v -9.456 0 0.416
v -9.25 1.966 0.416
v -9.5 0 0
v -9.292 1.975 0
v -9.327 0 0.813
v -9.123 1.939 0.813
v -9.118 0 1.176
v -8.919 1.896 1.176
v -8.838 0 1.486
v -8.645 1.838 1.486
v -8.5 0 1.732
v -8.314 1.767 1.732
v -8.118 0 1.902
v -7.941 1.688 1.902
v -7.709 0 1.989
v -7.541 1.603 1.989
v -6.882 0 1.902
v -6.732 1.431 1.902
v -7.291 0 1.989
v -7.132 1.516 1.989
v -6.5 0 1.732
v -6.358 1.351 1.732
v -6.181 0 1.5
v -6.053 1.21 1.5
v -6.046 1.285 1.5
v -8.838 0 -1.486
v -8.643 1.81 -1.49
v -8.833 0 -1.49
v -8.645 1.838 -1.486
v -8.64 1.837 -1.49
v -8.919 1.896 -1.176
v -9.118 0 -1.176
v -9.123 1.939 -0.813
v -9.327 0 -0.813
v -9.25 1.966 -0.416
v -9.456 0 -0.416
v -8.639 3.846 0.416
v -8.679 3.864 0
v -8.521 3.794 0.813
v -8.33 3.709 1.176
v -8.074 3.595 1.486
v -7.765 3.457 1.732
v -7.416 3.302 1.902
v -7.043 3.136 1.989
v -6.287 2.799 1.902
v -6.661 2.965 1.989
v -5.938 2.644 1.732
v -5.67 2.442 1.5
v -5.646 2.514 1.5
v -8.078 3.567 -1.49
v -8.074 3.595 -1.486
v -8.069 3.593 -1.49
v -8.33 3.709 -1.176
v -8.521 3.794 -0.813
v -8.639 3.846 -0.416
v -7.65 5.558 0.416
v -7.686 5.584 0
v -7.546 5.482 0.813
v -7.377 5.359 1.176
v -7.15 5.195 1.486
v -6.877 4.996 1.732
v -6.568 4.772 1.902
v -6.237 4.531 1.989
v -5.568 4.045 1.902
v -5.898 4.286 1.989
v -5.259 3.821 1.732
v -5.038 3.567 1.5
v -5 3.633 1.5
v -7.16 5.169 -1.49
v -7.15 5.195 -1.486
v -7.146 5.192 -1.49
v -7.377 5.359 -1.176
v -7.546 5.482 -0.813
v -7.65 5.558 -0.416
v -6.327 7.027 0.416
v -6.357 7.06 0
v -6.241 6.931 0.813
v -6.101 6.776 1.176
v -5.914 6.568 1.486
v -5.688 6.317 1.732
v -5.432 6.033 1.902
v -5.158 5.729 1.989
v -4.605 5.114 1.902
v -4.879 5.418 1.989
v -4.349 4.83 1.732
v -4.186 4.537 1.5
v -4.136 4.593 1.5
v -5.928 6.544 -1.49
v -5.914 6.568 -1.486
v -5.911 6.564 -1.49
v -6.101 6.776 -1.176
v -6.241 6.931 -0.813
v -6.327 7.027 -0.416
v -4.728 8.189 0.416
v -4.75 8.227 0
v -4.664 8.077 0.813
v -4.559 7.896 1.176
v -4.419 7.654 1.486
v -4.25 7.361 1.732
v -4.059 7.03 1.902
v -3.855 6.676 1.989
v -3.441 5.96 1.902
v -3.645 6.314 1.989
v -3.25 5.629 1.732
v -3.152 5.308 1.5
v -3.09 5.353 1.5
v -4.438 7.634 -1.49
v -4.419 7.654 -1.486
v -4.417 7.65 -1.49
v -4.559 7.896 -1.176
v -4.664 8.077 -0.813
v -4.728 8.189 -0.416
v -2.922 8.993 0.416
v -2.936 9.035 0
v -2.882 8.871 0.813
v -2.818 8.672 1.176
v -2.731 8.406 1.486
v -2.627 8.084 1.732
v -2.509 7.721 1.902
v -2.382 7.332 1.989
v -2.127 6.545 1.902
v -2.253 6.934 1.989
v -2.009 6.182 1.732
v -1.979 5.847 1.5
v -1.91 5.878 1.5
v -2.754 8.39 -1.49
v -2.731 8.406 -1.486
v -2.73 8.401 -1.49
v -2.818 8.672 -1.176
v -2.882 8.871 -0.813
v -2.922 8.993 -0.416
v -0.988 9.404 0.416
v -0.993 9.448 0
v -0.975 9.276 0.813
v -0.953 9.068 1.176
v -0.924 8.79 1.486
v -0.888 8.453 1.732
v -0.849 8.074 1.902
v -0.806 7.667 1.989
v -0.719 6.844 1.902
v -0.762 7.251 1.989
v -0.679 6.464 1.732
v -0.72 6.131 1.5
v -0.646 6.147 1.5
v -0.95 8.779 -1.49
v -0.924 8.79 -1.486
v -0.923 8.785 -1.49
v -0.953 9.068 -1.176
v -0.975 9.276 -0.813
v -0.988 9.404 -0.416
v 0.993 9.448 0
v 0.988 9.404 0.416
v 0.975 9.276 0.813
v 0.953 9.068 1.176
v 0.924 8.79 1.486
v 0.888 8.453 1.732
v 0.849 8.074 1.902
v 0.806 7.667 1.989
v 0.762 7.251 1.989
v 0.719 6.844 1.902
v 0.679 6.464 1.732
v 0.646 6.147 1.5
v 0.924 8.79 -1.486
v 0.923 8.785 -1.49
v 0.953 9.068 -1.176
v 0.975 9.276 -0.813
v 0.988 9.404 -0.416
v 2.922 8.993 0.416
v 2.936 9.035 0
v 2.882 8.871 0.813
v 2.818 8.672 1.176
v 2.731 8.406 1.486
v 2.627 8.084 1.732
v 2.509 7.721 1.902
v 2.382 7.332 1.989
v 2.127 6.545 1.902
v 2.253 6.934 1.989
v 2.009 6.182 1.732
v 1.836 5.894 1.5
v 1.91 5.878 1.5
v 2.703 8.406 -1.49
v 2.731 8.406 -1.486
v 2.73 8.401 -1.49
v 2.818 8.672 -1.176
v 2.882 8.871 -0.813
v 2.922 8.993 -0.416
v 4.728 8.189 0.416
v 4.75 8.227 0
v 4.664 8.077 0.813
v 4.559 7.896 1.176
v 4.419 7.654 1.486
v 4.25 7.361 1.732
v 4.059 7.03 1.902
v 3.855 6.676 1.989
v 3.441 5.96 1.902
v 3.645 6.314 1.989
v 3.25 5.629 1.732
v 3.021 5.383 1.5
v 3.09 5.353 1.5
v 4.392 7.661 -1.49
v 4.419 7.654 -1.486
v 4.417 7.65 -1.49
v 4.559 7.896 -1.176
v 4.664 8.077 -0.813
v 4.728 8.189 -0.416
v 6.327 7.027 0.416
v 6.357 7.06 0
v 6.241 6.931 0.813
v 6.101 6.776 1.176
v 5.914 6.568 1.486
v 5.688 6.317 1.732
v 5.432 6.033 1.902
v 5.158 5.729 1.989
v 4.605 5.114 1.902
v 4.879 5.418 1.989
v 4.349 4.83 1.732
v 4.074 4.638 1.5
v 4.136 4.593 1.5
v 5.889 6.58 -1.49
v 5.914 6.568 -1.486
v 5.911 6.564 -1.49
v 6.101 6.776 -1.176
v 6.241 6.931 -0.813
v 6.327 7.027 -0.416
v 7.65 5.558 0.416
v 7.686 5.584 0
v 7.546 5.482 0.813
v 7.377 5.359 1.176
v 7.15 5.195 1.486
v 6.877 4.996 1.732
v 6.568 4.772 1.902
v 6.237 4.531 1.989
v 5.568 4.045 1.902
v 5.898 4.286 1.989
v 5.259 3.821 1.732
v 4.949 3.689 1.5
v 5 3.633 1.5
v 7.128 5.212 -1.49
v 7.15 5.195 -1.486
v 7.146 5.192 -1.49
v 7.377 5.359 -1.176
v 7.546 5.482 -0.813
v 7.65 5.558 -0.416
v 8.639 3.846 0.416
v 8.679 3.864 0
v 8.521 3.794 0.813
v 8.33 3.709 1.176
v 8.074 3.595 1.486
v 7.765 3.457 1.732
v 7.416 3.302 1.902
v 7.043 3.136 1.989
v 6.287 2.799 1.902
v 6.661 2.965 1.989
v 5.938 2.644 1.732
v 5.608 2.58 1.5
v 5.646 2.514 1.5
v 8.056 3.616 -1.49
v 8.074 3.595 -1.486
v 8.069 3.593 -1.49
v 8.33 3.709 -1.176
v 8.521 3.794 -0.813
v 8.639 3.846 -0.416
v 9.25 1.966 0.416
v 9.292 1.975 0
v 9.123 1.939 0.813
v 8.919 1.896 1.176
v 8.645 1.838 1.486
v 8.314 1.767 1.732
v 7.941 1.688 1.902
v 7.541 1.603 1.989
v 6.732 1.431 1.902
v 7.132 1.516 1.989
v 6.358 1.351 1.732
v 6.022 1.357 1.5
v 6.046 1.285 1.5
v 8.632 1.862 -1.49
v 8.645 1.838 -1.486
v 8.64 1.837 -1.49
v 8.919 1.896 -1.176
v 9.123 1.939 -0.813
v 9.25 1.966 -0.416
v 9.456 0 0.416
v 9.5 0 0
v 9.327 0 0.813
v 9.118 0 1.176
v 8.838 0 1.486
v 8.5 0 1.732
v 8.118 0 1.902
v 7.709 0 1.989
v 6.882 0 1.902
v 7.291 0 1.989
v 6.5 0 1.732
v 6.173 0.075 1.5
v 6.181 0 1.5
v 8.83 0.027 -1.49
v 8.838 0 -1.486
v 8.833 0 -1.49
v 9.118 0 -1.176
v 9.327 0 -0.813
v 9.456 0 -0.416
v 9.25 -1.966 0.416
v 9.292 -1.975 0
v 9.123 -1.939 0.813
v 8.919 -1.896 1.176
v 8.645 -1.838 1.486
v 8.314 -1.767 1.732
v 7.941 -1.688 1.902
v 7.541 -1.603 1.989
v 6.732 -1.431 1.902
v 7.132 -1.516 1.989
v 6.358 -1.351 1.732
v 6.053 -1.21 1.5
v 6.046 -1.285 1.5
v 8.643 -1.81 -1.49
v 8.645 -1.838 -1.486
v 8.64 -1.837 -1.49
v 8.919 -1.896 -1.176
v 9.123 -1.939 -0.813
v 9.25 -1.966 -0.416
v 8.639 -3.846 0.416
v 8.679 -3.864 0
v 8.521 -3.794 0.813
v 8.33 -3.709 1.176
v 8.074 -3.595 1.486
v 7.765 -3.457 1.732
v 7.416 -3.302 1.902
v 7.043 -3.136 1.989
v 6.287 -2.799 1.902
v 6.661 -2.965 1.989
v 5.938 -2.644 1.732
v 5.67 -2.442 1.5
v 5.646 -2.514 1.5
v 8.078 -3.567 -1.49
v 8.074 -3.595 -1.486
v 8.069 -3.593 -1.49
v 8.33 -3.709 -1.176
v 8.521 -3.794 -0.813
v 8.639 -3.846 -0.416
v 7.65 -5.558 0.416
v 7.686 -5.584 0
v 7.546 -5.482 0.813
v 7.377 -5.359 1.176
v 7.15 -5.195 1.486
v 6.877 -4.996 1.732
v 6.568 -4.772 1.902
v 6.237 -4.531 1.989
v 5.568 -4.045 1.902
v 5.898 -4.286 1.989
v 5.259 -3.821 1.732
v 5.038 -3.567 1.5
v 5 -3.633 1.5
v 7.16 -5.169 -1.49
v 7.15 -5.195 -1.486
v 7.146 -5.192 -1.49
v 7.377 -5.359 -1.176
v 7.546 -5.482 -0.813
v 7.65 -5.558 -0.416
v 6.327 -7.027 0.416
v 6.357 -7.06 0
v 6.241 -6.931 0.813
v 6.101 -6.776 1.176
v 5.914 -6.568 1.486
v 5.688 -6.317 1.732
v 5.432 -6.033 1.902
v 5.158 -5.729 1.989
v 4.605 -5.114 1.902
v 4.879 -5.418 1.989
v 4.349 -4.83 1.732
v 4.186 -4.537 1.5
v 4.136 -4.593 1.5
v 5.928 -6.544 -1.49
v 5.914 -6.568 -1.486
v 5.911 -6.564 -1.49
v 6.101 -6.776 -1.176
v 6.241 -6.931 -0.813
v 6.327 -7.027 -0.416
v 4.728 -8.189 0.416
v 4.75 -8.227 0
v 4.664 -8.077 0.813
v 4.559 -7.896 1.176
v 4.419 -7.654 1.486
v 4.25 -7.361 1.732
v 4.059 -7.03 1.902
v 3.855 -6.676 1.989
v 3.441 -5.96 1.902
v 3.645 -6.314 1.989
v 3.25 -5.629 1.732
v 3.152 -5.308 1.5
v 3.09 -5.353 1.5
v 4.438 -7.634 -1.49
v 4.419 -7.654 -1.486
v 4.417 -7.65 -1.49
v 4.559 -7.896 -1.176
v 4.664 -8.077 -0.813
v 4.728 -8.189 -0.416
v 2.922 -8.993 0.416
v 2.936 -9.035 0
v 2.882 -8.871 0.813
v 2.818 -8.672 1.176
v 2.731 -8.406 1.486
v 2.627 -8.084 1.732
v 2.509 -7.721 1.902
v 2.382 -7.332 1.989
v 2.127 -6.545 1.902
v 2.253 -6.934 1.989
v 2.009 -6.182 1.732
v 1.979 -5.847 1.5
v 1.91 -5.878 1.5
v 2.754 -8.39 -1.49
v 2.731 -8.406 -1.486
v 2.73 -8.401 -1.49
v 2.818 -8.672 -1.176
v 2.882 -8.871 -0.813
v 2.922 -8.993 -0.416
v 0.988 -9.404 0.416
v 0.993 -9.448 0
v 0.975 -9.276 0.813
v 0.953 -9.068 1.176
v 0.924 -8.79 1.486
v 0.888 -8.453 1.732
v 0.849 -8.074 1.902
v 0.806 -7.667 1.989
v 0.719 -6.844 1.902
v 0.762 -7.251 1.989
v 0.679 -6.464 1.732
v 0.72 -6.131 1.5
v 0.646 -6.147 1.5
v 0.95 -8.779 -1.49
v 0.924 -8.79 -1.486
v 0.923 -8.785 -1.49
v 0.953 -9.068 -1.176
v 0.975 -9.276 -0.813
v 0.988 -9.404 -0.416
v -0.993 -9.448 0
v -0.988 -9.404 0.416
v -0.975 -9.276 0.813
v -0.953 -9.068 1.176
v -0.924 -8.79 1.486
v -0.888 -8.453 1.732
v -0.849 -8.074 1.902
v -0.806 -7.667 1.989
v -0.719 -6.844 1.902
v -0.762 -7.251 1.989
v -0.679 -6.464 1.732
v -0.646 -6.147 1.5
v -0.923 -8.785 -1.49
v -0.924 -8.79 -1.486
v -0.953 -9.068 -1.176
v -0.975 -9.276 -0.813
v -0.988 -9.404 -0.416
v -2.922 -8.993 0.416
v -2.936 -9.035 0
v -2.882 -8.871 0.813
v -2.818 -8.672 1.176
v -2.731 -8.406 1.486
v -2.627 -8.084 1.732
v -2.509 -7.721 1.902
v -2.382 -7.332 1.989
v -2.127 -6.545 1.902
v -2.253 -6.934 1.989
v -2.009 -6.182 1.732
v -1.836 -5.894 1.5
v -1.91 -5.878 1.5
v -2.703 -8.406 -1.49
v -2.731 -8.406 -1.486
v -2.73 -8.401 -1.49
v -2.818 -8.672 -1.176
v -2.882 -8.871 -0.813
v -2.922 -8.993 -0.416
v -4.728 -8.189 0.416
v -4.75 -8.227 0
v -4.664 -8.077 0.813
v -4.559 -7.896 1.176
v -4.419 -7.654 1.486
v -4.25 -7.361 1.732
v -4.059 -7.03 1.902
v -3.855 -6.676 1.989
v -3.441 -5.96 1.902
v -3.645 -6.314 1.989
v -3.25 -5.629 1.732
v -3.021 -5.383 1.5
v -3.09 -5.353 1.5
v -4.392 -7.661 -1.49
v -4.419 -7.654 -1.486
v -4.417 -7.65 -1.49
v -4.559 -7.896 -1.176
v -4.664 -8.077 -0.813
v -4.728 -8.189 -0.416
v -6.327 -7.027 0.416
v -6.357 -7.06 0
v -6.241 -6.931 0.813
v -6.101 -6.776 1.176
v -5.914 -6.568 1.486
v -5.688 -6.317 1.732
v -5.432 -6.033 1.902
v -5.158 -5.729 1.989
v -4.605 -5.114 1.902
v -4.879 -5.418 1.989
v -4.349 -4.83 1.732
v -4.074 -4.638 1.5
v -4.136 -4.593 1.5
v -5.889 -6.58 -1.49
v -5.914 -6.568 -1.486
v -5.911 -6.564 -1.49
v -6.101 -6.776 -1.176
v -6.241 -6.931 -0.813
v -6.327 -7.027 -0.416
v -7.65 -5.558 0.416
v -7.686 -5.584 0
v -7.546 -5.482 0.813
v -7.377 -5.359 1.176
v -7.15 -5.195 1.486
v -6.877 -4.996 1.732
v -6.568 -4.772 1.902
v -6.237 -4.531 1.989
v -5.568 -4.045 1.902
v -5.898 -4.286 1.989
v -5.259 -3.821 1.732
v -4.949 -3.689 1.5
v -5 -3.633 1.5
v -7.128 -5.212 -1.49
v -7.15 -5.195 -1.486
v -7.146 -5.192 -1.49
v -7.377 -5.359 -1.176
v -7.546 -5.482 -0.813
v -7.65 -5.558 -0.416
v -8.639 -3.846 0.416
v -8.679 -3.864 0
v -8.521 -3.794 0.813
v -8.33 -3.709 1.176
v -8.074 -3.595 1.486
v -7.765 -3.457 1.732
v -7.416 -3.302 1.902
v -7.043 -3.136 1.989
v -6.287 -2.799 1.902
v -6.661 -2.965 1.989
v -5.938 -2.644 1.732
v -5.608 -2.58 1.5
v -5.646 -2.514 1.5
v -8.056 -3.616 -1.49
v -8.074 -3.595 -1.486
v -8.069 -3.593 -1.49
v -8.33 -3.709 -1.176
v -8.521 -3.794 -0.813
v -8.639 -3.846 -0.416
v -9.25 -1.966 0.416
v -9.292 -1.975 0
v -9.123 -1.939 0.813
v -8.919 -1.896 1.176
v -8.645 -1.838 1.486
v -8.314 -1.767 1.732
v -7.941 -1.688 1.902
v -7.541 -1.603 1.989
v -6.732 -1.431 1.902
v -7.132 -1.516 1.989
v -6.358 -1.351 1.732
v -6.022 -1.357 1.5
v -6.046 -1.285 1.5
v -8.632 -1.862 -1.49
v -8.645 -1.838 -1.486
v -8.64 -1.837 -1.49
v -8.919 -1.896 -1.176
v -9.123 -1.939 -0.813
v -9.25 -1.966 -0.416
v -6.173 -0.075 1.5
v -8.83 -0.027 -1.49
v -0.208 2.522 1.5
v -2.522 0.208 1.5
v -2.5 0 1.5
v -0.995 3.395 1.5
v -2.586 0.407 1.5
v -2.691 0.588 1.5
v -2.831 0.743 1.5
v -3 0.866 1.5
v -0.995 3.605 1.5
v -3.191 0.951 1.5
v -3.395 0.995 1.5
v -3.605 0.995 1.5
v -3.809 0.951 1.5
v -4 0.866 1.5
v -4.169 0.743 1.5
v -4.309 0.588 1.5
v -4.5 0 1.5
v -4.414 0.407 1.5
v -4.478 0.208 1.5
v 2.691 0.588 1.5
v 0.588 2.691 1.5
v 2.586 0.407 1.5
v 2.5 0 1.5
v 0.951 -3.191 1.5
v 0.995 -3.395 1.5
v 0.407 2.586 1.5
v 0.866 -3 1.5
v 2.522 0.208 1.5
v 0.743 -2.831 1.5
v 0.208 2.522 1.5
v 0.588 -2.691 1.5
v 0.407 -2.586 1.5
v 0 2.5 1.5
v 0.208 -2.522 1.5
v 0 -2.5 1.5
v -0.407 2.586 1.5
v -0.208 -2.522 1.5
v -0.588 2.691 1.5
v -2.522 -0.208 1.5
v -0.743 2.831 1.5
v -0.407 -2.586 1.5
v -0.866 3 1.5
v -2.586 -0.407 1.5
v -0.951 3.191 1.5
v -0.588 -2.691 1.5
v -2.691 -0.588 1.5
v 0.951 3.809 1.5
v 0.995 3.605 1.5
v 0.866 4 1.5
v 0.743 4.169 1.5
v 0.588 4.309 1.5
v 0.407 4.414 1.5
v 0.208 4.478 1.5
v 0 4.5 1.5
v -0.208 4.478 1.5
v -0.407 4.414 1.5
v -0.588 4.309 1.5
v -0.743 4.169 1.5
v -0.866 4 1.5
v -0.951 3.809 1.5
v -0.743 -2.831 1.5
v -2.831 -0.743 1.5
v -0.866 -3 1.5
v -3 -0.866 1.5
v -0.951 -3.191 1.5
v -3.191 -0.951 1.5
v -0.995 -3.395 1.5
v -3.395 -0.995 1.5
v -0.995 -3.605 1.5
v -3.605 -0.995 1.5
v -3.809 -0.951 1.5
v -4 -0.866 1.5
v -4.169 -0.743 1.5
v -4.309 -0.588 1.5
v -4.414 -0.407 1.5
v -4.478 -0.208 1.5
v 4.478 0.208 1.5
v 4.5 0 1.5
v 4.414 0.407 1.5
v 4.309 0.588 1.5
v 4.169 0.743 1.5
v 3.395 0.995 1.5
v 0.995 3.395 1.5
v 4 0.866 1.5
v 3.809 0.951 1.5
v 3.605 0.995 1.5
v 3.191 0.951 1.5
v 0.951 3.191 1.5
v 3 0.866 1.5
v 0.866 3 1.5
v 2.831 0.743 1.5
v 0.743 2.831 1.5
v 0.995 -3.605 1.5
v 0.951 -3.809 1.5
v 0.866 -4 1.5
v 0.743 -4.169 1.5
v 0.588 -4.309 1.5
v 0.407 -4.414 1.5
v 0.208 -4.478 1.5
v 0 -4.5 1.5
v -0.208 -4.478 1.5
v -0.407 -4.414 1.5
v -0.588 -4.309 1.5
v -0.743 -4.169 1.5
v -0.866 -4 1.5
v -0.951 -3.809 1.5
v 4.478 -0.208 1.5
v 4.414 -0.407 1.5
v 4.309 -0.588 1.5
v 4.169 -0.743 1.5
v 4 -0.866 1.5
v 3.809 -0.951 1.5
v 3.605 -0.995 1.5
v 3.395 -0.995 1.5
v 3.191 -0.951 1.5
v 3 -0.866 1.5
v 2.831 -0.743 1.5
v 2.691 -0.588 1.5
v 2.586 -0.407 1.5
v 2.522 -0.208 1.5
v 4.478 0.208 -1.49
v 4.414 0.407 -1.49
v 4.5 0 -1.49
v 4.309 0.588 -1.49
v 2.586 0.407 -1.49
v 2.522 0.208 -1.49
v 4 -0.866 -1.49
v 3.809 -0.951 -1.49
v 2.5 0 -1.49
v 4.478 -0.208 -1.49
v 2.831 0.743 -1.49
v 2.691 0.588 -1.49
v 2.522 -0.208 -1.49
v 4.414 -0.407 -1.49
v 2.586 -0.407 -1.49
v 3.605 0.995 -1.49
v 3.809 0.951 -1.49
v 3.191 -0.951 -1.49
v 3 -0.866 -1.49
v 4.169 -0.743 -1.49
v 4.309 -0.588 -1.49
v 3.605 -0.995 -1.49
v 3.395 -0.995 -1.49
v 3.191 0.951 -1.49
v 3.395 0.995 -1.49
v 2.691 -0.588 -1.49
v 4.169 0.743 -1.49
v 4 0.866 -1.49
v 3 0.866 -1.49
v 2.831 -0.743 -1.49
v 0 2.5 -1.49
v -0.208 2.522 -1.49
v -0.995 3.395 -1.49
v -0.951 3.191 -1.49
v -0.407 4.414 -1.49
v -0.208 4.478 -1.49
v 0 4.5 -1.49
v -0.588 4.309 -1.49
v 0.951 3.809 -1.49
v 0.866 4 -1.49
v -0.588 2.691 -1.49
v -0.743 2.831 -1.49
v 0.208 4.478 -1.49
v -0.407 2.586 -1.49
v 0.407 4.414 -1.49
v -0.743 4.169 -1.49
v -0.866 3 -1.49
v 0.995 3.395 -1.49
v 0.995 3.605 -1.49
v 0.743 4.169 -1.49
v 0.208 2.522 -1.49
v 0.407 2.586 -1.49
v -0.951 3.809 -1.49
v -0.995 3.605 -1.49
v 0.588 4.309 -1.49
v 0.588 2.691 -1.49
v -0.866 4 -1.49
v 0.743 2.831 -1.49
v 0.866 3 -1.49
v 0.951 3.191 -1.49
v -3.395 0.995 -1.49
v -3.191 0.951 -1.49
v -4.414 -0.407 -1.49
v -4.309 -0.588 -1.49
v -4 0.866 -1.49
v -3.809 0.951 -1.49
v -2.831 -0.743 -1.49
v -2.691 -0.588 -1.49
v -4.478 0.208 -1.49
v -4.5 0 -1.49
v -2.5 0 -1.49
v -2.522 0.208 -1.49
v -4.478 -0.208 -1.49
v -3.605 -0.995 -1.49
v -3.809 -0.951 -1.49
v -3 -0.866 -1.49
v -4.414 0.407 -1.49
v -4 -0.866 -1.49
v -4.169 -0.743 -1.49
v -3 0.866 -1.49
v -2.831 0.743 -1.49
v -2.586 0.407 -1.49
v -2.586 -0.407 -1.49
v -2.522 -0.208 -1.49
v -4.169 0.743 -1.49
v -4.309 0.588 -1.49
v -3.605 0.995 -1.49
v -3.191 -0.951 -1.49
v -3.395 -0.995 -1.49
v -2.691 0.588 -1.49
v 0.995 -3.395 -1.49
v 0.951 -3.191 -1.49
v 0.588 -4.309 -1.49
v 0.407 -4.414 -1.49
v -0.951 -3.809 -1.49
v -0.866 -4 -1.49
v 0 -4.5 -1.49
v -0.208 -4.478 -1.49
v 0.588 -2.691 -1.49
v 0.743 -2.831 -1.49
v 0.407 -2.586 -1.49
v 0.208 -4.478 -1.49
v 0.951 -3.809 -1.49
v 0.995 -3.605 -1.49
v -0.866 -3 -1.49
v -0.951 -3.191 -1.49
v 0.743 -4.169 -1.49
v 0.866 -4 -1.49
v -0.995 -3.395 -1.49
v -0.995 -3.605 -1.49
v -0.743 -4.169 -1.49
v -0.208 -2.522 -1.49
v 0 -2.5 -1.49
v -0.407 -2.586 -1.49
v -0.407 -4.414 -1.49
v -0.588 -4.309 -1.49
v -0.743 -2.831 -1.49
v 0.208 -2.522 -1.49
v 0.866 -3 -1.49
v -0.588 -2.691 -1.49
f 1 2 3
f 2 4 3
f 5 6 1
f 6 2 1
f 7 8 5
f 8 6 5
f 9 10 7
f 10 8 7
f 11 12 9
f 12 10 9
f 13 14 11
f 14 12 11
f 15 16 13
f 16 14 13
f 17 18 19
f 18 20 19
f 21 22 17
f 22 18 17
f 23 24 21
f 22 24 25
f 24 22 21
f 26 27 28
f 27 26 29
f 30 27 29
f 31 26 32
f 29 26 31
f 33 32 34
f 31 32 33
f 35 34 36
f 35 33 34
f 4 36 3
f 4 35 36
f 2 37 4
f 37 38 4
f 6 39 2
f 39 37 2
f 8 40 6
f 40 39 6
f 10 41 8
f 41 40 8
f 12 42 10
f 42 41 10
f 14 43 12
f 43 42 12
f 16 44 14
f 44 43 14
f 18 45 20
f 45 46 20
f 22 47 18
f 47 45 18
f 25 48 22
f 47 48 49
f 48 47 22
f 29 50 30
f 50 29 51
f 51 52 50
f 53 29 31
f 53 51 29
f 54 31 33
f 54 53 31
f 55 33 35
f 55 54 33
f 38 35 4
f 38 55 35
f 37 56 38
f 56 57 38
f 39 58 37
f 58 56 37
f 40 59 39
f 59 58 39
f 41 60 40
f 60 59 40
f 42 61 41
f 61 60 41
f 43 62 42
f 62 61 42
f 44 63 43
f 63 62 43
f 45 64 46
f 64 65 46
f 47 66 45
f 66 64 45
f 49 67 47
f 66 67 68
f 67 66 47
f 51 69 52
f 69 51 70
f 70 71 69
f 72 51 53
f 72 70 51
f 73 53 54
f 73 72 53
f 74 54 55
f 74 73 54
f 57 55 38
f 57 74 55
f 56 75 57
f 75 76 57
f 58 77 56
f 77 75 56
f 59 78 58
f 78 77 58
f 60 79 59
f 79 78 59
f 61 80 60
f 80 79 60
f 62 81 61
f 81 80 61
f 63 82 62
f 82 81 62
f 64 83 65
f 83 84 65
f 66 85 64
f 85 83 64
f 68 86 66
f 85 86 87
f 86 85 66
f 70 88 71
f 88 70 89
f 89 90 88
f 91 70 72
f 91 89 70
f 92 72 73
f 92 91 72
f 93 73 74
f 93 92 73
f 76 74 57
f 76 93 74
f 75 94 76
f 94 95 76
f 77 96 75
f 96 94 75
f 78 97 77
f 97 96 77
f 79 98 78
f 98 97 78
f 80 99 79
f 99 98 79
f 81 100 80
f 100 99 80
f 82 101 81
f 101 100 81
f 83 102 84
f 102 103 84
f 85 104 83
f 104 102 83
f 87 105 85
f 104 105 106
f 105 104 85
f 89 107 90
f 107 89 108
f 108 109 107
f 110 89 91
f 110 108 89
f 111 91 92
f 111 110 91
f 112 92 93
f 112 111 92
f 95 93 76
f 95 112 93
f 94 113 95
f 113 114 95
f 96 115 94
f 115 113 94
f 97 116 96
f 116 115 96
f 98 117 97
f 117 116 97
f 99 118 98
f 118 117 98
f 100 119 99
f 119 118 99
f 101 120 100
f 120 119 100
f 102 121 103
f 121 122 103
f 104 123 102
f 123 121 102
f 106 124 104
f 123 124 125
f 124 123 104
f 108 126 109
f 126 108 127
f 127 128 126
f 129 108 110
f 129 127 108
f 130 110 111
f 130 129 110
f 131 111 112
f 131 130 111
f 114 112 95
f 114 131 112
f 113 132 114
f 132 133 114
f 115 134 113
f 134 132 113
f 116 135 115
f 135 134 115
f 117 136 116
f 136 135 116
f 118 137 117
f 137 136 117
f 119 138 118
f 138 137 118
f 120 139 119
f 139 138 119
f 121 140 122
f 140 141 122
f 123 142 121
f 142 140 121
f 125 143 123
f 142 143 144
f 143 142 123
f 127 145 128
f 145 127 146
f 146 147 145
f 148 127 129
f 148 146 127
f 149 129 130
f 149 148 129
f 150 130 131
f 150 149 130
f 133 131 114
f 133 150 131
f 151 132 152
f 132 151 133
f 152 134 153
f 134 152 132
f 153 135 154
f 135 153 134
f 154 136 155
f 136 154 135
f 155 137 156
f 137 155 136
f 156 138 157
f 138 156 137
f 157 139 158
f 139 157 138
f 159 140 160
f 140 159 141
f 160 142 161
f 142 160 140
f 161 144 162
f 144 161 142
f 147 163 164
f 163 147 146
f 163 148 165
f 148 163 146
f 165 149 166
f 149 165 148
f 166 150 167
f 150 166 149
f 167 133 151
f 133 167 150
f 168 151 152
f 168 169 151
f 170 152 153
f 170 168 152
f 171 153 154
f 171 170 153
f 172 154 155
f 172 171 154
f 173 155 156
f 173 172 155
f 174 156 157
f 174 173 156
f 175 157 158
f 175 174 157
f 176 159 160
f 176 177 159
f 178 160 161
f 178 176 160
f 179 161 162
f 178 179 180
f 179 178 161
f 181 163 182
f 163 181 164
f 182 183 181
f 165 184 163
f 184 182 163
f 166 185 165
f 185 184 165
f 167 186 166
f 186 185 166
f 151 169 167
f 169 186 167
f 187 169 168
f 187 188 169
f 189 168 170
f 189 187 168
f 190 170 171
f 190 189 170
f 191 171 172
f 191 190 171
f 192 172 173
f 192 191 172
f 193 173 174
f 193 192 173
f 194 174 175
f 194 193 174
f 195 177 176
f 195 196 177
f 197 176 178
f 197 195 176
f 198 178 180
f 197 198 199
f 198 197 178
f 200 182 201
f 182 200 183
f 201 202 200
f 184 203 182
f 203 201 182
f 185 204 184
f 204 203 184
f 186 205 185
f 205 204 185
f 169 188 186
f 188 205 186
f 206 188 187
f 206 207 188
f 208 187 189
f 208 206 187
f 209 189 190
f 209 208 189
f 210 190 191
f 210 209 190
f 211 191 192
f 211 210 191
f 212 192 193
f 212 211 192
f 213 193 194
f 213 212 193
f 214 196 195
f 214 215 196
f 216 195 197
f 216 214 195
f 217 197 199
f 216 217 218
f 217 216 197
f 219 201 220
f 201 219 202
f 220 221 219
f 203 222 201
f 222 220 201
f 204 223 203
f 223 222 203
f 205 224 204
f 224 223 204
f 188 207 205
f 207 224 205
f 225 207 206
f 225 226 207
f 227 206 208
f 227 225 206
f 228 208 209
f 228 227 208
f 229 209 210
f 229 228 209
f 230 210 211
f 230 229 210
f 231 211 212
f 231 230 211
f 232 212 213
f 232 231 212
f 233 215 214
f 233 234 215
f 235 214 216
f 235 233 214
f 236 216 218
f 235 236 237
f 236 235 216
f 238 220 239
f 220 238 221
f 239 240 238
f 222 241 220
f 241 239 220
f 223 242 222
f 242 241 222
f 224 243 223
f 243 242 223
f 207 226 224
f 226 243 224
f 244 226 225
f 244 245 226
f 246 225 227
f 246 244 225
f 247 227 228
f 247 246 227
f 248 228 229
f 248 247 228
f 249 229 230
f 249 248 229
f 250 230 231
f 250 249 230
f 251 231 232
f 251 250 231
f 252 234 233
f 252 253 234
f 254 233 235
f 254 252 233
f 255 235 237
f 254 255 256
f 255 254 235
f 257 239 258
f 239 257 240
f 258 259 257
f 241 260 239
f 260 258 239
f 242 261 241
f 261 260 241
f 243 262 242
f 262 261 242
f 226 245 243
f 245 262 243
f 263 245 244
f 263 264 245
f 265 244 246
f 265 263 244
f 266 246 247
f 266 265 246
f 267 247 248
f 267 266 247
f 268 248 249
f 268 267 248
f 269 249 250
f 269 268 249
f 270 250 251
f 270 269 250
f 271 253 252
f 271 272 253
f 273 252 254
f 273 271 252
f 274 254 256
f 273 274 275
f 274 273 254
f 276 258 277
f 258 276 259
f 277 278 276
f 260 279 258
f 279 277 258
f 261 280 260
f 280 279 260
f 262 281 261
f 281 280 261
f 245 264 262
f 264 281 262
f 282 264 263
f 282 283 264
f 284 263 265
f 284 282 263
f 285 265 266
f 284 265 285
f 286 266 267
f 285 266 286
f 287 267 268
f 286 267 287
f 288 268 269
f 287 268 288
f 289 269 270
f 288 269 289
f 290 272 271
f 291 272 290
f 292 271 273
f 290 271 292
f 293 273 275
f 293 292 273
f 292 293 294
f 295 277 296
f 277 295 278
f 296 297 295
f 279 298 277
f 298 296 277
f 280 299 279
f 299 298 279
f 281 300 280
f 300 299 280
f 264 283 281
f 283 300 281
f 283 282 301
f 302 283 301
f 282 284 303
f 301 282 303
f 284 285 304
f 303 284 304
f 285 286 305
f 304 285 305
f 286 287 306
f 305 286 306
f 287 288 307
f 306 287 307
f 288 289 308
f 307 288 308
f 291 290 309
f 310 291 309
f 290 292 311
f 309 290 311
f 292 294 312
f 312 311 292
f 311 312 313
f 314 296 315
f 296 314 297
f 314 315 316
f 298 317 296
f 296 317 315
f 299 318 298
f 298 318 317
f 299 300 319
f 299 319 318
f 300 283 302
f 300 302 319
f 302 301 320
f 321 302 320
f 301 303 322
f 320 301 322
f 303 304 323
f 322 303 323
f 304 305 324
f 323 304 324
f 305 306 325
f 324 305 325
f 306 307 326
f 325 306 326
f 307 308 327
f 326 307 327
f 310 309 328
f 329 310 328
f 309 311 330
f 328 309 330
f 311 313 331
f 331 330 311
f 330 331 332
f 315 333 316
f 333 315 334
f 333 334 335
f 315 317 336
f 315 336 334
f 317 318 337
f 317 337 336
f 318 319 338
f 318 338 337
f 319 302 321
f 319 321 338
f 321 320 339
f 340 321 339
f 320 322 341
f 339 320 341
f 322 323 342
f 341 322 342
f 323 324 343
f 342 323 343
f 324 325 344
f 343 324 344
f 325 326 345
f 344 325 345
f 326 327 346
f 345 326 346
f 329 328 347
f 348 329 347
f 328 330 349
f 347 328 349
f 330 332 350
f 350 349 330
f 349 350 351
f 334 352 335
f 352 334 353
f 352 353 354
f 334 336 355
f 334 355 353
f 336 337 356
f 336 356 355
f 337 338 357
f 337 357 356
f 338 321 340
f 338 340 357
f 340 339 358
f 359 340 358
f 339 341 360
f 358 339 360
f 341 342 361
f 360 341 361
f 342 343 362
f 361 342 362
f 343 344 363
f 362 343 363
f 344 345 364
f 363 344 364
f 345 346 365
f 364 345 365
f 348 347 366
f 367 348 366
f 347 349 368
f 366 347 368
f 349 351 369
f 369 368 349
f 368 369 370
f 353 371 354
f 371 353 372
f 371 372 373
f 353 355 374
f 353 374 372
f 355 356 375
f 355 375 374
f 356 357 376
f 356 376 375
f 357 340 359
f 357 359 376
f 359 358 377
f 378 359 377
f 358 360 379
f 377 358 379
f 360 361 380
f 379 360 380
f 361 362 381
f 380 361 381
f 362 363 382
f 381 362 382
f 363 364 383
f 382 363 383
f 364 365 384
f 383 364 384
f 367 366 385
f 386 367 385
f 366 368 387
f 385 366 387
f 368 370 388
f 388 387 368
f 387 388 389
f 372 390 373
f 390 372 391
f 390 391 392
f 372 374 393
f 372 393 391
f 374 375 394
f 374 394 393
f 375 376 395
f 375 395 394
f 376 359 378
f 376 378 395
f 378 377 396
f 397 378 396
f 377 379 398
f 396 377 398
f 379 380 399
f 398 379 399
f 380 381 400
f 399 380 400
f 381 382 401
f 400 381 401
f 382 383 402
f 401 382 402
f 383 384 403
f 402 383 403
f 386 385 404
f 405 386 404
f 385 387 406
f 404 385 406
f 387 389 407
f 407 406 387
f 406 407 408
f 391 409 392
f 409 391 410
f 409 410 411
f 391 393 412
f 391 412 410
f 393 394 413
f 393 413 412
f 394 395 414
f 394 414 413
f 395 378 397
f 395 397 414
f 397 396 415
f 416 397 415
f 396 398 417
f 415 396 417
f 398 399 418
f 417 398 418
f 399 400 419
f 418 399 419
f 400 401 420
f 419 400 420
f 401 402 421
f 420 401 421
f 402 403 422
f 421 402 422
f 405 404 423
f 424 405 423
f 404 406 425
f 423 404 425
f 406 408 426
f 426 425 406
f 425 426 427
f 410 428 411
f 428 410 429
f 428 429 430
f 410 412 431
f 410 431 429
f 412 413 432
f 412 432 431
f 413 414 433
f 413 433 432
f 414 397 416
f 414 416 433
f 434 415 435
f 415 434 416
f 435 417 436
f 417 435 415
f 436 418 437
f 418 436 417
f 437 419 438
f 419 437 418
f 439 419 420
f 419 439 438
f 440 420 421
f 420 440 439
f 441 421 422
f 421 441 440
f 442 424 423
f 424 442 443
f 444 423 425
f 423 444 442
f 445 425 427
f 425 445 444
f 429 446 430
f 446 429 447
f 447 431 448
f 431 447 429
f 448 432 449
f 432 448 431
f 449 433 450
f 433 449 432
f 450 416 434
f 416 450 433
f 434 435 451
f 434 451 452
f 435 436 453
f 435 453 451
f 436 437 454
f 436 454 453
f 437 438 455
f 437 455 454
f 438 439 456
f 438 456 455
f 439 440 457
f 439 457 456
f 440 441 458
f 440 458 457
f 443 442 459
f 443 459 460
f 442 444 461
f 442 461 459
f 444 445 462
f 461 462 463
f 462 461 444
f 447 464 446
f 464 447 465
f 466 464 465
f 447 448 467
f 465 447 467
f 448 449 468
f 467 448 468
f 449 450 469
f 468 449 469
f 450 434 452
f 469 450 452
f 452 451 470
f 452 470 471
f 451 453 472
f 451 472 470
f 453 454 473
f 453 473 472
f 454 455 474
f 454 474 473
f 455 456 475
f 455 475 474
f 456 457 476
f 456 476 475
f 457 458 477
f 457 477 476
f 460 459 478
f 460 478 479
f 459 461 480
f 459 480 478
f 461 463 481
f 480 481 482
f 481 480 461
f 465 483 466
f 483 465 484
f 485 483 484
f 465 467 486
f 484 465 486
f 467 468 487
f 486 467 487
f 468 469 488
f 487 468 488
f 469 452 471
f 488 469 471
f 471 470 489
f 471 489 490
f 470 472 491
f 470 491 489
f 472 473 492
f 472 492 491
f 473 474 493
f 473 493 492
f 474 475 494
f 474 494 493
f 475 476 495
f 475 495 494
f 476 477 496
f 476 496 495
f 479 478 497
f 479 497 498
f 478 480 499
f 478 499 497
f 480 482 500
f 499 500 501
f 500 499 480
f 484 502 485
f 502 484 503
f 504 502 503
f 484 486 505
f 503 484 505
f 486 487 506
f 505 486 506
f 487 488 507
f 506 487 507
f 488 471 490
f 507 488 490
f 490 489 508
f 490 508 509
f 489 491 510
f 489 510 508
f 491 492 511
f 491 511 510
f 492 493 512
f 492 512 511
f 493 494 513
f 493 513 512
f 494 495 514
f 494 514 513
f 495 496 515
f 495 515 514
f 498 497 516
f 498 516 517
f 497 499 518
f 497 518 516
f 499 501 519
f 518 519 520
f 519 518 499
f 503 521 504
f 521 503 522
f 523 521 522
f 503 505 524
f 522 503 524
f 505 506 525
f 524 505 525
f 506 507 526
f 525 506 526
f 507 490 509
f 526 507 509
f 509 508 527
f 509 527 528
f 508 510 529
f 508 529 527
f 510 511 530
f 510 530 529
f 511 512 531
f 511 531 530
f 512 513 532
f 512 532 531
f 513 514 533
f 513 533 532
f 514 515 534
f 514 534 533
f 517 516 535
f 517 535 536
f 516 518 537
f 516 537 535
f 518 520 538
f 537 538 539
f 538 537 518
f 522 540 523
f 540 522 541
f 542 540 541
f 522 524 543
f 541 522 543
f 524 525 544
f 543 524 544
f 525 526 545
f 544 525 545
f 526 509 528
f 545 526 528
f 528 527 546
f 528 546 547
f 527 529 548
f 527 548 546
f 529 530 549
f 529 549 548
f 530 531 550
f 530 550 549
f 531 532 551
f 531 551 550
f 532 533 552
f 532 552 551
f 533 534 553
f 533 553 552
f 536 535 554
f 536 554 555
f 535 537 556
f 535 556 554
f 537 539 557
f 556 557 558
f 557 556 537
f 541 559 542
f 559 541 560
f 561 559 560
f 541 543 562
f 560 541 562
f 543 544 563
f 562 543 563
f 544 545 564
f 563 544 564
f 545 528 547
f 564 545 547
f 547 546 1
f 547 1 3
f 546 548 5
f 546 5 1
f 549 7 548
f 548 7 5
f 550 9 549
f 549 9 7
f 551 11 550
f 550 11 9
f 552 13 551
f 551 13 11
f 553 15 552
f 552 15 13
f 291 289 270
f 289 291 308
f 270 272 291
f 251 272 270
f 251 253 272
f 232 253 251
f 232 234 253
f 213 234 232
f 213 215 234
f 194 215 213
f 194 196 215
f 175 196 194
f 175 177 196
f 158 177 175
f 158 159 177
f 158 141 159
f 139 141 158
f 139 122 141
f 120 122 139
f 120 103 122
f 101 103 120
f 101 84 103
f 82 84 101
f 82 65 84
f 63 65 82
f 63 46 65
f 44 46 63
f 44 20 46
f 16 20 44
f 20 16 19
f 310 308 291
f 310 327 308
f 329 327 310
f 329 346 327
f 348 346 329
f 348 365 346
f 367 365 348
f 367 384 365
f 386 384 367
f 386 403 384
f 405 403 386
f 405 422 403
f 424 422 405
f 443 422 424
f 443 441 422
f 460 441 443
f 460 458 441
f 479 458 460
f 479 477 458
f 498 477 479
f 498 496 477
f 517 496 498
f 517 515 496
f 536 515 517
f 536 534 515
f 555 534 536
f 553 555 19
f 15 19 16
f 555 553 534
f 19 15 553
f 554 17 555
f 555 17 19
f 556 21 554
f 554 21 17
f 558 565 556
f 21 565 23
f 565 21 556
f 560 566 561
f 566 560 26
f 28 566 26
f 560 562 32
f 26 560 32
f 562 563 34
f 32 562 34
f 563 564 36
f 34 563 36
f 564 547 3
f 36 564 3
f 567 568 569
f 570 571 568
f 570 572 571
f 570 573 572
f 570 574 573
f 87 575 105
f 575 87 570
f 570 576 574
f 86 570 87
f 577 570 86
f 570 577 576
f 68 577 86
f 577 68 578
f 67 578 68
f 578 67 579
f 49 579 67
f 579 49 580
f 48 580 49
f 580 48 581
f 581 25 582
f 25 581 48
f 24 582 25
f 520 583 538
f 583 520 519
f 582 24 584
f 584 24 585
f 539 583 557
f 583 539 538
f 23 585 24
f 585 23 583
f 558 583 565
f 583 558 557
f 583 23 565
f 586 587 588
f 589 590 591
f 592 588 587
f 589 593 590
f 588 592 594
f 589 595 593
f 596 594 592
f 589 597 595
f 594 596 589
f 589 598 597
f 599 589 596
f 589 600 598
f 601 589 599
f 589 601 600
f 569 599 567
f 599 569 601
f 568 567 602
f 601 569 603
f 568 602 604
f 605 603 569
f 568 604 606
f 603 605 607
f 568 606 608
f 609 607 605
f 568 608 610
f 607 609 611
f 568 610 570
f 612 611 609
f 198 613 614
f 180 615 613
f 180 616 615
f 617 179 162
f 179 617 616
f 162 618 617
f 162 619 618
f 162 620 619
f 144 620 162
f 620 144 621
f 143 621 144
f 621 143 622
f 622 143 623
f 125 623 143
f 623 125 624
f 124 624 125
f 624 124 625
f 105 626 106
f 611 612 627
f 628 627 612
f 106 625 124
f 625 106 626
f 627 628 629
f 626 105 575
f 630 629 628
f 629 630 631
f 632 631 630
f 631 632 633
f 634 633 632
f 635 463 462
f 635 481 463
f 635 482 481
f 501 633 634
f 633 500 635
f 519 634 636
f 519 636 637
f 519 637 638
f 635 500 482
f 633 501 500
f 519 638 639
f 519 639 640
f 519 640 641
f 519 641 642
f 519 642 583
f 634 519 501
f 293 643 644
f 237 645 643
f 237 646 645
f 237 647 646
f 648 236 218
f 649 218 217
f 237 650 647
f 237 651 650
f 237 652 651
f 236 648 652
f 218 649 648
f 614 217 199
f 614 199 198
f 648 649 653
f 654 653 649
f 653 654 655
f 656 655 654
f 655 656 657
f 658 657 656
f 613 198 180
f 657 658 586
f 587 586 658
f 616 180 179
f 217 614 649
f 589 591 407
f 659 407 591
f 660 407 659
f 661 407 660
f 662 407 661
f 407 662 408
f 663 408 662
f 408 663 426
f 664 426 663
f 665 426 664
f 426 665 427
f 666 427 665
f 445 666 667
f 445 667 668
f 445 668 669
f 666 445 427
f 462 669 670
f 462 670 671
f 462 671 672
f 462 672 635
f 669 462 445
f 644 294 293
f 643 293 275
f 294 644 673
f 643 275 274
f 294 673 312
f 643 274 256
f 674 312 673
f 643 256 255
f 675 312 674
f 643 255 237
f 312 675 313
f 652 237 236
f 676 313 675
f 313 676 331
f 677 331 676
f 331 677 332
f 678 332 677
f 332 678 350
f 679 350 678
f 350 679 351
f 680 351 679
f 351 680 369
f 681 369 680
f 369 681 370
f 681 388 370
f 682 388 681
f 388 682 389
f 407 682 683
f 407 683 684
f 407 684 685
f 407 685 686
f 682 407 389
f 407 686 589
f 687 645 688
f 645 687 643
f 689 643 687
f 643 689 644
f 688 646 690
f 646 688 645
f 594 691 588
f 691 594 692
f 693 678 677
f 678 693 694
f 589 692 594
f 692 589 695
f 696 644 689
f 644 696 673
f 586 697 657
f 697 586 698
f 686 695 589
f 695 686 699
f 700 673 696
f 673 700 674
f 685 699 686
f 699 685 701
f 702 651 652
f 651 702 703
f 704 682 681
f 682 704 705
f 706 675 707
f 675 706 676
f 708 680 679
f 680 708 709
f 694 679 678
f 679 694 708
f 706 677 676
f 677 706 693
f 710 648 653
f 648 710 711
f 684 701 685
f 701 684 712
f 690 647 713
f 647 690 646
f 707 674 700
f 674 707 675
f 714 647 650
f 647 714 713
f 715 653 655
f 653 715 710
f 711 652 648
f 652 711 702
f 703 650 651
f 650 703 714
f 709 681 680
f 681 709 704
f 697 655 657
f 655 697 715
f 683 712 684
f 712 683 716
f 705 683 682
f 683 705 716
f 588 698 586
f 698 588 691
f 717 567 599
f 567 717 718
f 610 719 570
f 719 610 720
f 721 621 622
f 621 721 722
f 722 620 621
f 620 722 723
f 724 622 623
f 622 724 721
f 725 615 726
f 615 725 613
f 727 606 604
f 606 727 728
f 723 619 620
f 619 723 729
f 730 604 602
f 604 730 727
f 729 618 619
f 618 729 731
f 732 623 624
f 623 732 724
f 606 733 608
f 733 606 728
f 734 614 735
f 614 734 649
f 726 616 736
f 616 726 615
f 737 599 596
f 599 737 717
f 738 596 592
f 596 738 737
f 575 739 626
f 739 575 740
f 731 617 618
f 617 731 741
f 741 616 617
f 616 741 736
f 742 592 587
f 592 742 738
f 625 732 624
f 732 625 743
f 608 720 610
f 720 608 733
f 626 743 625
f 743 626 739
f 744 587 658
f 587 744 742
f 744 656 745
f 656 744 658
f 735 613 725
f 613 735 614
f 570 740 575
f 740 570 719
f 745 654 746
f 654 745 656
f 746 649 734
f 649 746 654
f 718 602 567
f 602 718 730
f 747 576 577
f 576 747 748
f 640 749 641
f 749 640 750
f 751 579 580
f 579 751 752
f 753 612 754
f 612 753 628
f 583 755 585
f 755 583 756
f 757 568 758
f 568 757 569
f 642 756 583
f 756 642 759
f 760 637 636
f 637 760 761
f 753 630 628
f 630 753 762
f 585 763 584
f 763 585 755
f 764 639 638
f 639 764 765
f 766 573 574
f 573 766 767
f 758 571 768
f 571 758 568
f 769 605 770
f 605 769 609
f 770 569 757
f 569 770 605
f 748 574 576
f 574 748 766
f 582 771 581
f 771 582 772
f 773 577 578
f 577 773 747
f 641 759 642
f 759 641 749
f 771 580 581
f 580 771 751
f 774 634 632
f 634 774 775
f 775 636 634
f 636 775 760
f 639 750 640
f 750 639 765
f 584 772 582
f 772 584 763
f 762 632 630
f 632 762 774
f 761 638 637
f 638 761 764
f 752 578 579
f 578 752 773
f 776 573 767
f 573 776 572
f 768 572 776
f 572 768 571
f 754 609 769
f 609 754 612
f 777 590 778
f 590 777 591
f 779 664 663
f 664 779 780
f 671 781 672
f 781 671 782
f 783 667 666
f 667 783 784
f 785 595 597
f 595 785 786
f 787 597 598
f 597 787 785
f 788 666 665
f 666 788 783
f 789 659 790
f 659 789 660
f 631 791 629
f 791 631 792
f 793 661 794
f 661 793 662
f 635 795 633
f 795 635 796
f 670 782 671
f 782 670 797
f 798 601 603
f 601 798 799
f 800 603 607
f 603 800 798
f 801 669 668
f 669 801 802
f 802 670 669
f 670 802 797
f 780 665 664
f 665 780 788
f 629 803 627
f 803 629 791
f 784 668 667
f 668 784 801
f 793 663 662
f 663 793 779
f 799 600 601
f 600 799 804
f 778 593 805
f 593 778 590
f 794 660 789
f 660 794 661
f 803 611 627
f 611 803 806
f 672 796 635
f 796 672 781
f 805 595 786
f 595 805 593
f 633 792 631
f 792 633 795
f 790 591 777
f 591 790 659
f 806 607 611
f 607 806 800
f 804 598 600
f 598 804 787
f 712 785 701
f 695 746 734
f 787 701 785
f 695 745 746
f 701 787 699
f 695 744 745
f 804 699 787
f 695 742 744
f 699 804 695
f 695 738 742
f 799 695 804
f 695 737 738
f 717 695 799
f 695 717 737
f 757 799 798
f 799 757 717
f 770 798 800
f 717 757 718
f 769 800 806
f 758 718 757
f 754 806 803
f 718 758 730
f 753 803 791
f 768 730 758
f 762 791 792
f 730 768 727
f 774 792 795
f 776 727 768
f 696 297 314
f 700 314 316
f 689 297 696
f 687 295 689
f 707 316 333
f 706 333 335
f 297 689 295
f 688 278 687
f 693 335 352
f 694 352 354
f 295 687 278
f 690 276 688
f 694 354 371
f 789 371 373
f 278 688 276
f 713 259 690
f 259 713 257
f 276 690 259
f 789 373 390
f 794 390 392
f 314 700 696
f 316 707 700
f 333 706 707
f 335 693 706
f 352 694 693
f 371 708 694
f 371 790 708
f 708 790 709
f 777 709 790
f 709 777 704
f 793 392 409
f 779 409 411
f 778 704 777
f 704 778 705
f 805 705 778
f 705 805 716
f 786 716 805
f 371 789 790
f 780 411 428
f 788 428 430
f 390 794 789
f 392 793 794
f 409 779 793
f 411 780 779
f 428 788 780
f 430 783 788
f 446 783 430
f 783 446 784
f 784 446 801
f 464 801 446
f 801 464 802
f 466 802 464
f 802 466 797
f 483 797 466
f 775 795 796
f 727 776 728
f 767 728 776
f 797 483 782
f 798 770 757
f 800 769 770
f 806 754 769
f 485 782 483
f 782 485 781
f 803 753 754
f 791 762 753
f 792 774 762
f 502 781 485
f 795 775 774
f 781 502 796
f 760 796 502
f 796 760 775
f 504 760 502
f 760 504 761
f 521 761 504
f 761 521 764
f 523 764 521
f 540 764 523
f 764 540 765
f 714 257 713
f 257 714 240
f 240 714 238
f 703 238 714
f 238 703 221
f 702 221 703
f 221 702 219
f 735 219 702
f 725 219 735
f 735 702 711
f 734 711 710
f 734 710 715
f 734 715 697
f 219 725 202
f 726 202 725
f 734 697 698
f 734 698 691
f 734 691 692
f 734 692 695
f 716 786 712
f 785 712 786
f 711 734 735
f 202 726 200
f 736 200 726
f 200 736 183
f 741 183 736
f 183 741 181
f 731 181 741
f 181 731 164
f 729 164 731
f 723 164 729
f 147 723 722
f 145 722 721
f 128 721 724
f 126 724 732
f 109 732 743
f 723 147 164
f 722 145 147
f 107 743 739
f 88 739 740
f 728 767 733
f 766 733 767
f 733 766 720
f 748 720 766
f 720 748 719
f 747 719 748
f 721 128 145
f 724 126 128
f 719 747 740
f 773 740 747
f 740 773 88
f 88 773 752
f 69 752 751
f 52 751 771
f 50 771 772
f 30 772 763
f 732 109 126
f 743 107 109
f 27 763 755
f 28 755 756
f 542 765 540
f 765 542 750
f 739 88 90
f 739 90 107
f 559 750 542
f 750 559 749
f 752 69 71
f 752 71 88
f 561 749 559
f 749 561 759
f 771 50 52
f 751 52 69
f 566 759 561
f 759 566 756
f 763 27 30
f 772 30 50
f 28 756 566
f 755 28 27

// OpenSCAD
/* [Settings] */
// diameter of the button
OD = 15;
// how many sewing holes you want, set to 0 for none
numHoles = 4;
// thickness of button
thickness = 3;
// how far the holes are spaced from the center
holerRimOD = 7;
// size of sewing holes
holeOD = 2;
// size of outer fillet
rimRadius = 2;
// type of button cut
flatStat = "bottom"; // [top,bottom,both,none]


// calculations
holeOr = holeOD/2;
Or = OD/2;
holeRimOr = holerRimOD/2;

module button() {
	$fn = 30;
	difference() {
		union() {
			// fillet rims
			rotate_extrude() {
				translate([Or,0])
				circle(rimRadius,true);
			}
			// center cylinder
			cylinder(h = thickness, r = Or, center = true);
		}

		union() {
			// cutout hotes
			for (i = [0:numHoles]) {
				rotate([0,0,i*360/numHoles]) {
					translate([holeRimOr,0,0]) {
						cylinder(h = thickness*1.1, r = holeOr, center = true);
					}
				}
			}

			if (flatStat == "top") {
				translate([0,0,(rimRadius + thickness)/2 - 0.01])
				cylinder(h = rimRadius, r = OD*1.5, center = true);
			} else if (flatStat == "bottom") {
				translate([0,0,-(rimRadius + thickness)/2 + 0.01])
				cylinder(h = rimRadius, r = OD*1.5, center = true);
			} else if (flatStat == "both") {
				translate([0,0,(rimRadius + thickness)/2 - 0.01])
				cylinder(h = rimRadius, r = OD*1.5, center = true);

				translate([0,0,-(rimRadius + thickness)/2 + 0.01])
				cylinder(h = rimRadius, r = OD*1.5, center = true);
			}
		}
	}
}

button();
